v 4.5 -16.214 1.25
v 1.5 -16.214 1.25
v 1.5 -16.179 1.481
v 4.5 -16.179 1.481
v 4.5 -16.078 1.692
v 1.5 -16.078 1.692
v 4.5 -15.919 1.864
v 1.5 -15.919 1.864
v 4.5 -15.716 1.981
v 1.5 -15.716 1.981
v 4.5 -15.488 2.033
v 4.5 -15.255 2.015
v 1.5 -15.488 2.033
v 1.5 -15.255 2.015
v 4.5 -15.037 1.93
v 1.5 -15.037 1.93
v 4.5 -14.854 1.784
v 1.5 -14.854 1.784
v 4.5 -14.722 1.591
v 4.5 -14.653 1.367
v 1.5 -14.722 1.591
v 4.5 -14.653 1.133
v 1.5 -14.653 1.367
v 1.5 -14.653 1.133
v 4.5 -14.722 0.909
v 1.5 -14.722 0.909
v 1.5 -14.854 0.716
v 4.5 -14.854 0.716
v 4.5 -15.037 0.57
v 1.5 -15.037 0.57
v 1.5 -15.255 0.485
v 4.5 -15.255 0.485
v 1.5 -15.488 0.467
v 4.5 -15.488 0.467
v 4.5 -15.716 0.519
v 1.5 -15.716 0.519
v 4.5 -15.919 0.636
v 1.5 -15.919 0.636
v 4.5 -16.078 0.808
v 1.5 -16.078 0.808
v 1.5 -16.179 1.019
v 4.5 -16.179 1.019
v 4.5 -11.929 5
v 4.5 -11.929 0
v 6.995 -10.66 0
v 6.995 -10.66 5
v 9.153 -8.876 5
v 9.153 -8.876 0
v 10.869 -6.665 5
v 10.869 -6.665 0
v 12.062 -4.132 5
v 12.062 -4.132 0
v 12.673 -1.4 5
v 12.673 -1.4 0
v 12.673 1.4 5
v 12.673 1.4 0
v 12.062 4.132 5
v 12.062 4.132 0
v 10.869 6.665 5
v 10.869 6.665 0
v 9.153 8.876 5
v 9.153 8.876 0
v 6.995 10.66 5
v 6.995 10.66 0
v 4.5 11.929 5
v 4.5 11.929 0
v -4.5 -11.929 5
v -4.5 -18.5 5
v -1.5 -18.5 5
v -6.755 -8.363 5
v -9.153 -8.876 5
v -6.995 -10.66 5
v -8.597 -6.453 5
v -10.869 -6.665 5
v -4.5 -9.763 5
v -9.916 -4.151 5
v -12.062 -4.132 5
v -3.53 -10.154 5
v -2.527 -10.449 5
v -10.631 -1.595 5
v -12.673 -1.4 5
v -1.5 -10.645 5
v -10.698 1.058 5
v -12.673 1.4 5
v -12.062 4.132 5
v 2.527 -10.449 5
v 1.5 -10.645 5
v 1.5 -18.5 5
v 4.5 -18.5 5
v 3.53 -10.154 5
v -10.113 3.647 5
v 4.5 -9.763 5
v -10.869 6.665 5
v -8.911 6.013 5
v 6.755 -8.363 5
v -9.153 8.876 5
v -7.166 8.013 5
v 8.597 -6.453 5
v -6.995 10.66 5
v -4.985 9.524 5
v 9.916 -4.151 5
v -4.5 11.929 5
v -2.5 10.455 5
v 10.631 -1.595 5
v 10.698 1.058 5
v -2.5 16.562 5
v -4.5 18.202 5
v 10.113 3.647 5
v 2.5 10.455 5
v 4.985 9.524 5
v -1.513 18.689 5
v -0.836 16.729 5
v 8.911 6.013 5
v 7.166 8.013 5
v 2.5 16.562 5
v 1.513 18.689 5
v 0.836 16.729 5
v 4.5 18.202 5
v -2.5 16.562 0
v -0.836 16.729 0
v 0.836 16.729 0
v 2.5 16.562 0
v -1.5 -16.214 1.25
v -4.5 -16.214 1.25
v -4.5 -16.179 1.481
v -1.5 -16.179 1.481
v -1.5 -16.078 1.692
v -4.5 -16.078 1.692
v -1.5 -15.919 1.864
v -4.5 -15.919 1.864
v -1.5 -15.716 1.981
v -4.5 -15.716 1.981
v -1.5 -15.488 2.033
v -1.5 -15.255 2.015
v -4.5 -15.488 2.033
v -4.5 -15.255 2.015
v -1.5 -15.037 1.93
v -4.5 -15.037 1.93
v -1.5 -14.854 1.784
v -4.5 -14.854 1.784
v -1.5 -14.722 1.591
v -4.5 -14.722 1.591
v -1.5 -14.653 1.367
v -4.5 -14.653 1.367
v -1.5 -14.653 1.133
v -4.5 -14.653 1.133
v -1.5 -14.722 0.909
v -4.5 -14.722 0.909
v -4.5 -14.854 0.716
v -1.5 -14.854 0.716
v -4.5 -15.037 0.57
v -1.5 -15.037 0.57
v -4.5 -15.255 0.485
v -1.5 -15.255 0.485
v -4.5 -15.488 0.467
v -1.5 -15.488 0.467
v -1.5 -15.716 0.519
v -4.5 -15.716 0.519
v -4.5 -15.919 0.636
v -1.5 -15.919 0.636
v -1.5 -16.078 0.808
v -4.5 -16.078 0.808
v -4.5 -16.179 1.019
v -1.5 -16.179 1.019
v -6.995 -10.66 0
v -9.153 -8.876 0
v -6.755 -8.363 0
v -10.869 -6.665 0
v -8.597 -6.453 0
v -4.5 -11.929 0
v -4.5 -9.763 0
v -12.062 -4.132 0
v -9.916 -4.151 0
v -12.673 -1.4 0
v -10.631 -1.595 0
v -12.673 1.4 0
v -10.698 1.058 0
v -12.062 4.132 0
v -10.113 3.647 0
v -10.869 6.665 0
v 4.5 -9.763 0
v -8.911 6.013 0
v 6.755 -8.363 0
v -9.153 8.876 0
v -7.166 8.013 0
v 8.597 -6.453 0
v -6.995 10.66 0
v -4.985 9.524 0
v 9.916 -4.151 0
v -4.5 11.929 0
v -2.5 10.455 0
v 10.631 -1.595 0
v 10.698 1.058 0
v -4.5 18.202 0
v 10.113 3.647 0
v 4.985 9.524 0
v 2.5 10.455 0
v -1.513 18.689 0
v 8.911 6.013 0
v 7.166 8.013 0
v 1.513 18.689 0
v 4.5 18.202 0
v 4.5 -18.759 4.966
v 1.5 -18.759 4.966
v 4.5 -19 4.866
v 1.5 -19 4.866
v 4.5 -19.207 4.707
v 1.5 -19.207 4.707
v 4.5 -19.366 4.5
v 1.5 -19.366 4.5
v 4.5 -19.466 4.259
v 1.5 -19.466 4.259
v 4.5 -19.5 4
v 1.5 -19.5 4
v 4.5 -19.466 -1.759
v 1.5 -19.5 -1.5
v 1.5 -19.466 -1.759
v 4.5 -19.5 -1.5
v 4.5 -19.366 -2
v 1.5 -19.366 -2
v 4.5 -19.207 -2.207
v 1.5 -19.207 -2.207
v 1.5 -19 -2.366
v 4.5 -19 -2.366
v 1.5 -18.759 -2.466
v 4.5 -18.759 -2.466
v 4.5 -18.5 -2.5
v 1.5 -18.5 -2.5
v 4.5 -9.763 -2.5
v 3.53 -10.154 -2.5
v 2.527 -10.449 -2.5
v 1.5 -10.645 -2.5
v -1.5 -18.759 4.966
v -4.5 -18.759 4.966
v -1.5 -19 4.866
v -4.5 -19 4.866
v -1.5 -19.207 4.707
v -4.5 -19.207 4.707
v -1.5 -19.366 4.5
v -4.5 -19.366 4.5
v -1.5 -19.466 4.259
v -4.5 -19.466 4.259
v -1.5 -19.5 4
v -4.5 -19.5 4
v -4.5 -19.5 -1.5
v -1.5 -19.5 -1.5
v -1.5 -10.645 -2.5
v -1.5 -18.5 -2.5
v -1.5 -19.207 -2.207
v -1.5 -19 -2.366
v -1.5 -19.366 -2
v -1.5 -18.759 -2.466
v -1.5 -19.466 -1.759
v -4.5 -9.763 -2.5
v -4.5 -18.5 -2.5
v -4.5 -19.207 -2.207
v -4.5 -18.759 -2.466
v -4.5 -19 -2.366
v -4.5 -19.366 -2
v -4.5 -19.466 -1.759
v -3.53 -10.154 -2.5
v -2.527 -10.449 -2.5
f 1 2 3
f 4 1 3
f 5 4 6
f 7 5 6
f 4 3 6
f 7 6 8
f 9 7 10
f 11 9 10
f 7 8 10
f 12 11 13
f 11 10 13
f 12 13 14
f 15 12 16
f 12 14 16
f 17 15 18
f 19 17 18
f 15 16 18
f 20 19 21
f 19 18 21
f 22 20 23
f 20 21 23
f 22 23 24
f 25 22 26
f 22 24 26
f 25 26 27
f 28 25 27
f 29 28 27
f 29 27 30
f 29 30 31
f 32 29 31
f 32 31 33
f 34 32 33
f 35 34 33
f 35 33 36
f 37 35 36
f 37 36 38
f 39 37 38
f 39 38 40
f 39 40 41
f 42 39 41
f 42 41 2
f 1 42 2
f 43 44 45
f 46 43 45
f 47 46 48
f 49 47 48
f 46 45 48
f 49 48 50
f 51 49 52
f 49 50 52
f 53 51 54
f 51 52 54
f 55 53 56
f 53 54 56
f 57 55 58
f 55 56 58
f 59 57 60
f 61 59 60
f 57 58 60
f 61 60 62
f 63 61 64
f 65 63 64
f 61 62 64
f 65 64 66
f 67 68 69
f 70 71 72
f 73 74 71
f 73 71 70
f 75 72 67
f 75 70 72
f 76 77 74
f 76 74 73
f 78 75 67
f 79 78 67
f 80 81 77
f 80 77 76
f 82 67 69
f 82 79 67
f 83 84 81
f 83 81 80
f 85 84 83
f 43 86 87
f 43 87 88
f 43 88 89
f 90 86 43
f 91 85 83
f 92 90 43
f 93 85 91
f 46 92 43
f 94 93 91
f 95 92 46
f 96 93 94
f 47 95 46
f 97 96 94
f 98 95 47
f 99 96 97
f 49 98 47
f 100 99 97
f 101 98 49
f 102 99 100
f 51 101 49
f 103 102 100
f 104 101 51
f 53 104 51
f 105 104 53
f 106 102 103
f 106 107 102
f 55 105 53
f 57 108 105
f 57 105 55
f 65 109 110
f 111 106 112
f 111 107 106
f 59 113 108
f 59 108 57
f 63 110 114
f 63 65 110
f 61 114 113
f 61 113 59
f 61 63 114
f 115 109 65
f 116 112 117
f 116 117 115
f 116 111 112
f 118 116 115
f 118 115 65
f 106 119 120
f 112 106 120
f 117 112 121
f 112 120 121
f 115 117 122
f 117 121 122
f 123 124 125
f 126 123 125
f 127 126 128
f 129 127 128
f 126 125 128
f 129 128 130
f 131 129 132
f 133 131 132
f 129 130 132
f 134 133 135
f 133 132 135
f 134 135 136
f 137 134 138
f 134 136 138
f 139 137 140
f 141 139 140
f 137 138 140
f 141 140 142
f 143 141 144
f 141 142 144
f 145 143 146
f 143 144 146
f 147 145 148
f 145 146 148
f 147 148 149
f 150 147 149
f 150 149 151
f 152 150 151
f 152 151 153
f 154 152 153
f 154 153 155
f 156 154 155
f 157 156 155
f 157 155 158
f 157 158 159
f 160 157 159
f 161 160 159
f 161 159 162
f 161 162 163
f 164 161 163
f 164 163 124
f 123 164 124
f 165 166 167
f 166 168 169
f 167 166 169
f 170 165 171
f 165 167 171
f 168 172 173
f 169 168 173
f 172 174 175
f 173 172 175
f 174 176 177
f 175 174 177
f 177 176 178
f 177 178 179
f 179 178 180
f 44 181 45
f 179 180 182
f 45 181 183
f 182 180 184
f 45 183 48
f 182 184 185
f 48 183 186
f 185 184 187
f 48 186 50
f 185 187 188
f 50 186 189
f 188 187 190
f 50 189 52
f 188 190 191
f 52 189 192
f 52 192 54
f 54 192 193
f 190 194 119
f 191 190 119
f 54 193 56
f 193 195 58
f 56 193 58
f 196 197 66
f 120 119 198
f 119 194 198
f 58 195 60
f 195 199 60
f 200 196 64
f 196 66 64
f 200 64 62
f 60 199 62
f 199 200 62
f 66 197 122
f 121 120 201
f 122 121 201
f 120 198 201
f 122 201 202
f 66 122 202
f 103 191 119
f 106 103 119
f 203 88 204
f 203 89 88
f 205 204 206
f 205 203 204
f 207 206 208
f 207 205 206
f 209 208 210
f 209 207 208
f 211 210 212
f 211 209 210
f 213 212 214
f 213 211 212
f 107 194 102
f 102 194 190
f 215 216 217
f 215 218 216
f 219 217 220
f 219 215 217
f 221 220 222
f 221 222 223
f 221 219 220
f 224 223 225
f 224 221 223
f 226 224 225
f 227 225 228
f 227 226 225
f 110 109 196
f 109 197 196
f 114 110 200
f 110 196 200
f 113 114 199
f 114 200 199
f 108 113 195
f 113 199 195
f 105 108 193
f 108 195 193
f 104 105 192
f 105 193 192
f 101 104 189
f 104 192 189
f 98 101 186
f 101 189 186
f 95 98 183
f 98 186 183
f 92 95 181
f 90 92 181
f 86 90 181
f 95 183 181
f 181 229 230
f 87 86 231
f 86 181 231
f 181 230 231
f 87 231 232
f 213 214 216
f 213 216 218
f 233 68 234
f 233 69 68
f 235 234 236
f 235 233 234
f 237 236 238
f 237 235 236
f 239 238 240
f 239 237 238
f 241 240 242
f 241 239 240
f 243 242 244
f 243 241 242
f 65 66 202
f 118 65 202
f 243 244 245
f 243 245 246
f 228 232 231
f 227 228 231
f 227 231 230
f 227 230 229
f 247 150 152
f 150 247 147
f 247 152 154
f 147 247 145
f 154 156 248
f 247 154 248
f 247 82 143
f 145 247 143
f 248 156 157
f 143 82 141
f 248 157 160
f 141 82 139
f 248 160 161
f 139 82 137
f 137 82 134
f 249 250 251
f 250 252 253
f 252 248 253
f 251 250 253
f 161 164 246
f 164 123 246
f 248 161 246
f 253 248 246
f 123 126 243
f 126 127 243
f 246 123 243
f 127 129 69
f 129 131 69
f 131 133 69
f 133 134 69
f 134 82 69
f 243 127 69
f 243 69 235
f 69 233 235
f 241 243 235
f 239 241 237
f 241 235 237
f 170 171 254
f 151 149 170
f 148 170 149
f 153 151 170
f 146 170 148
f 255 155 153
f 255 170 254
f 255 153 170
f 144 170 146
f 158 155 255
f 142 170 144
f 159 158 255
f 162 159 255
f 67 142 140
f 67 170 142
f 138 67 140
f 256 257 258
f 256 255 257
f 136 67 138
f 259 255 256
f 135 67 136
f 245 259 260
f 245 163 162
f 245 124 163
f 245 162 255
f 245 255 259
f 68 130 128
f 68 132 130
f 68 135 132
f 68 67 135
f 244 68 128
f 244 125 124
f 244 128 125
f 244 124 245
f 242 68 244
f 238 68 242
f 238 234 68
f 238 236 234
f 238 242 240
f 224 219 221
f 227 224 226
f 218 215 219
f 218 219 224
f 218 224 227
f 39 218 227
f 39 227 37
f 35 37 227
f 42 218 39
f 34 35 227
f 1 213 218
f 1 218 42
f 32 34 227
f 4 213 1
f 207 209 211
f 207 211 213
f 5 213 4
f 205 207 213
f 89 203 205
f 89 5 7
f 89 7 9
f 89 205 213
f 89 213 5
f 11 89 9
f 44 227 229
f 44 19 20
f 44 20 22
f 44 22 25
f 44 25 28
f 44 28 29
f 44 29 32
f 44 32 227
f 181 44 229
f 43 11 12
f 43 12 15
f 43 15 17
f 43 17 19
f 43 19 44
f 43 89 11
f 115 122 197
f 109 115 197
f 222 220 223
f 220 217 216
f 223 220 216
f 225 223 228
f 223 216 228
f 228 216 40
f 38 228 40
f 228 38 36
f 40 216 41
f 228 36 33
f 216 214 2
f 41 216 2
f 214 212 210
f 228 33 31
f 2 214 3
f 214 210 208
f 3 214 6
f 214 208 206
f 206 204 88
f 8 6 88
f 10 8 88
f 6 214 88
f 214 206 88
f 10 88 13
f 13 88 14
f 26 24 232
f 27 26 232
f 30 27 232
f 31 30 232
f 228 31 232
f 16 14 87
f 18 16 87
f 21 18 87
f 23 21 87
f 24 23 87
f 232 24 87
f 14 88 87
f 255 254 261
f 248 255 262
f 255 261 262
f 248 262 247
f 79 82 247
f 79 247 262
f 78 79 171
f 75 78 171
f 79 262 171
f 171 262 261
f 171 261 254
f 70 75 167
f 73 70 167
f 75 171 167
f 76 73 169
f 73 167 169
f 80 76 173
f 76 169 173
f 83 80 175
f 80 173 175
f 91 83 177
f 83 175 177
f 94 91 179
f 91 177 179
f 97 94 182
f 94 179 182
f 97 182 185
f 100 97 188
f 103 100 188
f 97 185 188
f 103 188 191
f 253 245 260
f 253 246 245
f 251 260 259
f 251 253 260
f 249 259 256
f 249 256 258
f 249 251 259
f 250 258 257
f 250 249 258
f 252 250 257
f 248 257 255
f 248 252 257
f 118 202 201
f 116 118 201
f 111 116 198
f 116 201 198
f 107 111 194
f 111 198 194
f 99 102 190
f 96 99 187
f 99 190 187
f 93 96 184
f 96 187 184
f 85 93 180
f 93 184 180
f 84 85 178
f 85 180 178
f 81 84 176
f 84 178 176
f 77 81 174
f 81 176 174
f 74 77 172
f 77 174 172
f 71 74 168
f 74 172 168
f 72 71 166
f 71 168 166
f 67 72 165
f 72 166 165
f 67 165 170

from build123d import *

# Parameters (mm, degrees)
F1_DEPTH = 5
F3_DEPTH = 7.5
F5_DEPTH = 7.5
F6_R     = 1
F7_R     = 0.7847872087
F8_DEPTH = 25


with BuildPart() as f1:
    # F0 (on Top) → F1 (new body)
    with BuildSketch(Plane.XY):
        with BuildLine():
            Line((-4.5, 18.2019916493), (-4.5, 11.9294802904))
            ThreePointArc((-4.5, 11.9294802904), (0, -12.75), (4.5, 11.9294802904))
            Line((4.5, 11.9294802904), (4.5, 18.2019916493))
            ThreePointArc((4.5, 18.2019916493), (0, 18.75), (-4.5, 18.2019916493))
        make_face()
        with BuildLine():
            ThreePointArc((2.5, 10.4552618332), (0, -10.75), (-2.5, 10.4552618332))
            Line((-2.5, 10.4552618332), (-2.5, 16.5623820751))
            ThreePointArc((-2.5, 16.5623820751), (0, 16.75), (2.5, 16.5623820751))
            Line((2.5, 16.5623820751), (2.5, 10.4552618332))
        make_face(mode=Mode.SUBTRACT)
    extrude(amount=F1_DEPTH)

    # F2 (on face) → F3 (join)
    with BuildSketch(Plane.XY.offset(5)):
        with BuildLine():
            ThreePointArc((4.5, -9.7628120949), (0, -10.75), (-4.5, -9.7628120949))
            Line((-4.5, -9.7628120949), (-4.5, -11.9294802904))
            ThreePointArc((-4.5, -11.9294802904), (0, -12.75), (4.5, -11.9294802904))
            Line((4.5, -11.9294802904), (4.5, -9.7628120949))
        make_face()
        with BuildLine():
            ThreePointArc((4.5, -11.9294802904), (0, -12.75), (-4.5, -11.9294802904))
            Line((-4.5, -11.9294802904), (-4.5, -19.5))
            Line((-4.5, -19.5), (4.5, -19.5))
            Line((4.5, -19.5), (4.5, -11.9294802904))
        make_face()
    extrude(amount=-F3_DEPTH)

    # F4 (on face) → F5 (cut, through all)
    with BuildSketch(Plane.XY.offset(5)):
        with BuildLine():
            ThreePointArc((1.5, -10.644834428), (0, -10.75), (-1.5, -10.644834428))
            Line((-1.5, -10.644834428), (-1.5, -19.5))
            Line((-1.5, -19.5), (1.5, -19.5))
            Line((1.5, -19.5), (1.5, -10.644834428))
        make_face()
    extrude(amount=-F5_DEPTH, mode=Mode.SUBTRACT)

    # F6
    f6_edges = [f1.edges().sort_by_distance(p)[0] for p in [
        (-3, -19.5, 5),
        (3, -19.5, 5),
        (3, -19.5, -2.5),
        (-3, -19.5, -2.5),
    ]]
    fillet(f6_edges, radius=F6_R)

    # F7 (on face) → F8 (cut)
    with BuildSketch(Plane(origin=(-4.5, 0, 0), x_dir=(0, -1, 0), z_dir=(-1, 0, 0))):
        with Locations((15.4294802904, 1.25)):
            Circle(F7_R)
    extrude(amount=-F8_DEPTH, mode=Mode.SUBTRACT)


solid = f1.part
